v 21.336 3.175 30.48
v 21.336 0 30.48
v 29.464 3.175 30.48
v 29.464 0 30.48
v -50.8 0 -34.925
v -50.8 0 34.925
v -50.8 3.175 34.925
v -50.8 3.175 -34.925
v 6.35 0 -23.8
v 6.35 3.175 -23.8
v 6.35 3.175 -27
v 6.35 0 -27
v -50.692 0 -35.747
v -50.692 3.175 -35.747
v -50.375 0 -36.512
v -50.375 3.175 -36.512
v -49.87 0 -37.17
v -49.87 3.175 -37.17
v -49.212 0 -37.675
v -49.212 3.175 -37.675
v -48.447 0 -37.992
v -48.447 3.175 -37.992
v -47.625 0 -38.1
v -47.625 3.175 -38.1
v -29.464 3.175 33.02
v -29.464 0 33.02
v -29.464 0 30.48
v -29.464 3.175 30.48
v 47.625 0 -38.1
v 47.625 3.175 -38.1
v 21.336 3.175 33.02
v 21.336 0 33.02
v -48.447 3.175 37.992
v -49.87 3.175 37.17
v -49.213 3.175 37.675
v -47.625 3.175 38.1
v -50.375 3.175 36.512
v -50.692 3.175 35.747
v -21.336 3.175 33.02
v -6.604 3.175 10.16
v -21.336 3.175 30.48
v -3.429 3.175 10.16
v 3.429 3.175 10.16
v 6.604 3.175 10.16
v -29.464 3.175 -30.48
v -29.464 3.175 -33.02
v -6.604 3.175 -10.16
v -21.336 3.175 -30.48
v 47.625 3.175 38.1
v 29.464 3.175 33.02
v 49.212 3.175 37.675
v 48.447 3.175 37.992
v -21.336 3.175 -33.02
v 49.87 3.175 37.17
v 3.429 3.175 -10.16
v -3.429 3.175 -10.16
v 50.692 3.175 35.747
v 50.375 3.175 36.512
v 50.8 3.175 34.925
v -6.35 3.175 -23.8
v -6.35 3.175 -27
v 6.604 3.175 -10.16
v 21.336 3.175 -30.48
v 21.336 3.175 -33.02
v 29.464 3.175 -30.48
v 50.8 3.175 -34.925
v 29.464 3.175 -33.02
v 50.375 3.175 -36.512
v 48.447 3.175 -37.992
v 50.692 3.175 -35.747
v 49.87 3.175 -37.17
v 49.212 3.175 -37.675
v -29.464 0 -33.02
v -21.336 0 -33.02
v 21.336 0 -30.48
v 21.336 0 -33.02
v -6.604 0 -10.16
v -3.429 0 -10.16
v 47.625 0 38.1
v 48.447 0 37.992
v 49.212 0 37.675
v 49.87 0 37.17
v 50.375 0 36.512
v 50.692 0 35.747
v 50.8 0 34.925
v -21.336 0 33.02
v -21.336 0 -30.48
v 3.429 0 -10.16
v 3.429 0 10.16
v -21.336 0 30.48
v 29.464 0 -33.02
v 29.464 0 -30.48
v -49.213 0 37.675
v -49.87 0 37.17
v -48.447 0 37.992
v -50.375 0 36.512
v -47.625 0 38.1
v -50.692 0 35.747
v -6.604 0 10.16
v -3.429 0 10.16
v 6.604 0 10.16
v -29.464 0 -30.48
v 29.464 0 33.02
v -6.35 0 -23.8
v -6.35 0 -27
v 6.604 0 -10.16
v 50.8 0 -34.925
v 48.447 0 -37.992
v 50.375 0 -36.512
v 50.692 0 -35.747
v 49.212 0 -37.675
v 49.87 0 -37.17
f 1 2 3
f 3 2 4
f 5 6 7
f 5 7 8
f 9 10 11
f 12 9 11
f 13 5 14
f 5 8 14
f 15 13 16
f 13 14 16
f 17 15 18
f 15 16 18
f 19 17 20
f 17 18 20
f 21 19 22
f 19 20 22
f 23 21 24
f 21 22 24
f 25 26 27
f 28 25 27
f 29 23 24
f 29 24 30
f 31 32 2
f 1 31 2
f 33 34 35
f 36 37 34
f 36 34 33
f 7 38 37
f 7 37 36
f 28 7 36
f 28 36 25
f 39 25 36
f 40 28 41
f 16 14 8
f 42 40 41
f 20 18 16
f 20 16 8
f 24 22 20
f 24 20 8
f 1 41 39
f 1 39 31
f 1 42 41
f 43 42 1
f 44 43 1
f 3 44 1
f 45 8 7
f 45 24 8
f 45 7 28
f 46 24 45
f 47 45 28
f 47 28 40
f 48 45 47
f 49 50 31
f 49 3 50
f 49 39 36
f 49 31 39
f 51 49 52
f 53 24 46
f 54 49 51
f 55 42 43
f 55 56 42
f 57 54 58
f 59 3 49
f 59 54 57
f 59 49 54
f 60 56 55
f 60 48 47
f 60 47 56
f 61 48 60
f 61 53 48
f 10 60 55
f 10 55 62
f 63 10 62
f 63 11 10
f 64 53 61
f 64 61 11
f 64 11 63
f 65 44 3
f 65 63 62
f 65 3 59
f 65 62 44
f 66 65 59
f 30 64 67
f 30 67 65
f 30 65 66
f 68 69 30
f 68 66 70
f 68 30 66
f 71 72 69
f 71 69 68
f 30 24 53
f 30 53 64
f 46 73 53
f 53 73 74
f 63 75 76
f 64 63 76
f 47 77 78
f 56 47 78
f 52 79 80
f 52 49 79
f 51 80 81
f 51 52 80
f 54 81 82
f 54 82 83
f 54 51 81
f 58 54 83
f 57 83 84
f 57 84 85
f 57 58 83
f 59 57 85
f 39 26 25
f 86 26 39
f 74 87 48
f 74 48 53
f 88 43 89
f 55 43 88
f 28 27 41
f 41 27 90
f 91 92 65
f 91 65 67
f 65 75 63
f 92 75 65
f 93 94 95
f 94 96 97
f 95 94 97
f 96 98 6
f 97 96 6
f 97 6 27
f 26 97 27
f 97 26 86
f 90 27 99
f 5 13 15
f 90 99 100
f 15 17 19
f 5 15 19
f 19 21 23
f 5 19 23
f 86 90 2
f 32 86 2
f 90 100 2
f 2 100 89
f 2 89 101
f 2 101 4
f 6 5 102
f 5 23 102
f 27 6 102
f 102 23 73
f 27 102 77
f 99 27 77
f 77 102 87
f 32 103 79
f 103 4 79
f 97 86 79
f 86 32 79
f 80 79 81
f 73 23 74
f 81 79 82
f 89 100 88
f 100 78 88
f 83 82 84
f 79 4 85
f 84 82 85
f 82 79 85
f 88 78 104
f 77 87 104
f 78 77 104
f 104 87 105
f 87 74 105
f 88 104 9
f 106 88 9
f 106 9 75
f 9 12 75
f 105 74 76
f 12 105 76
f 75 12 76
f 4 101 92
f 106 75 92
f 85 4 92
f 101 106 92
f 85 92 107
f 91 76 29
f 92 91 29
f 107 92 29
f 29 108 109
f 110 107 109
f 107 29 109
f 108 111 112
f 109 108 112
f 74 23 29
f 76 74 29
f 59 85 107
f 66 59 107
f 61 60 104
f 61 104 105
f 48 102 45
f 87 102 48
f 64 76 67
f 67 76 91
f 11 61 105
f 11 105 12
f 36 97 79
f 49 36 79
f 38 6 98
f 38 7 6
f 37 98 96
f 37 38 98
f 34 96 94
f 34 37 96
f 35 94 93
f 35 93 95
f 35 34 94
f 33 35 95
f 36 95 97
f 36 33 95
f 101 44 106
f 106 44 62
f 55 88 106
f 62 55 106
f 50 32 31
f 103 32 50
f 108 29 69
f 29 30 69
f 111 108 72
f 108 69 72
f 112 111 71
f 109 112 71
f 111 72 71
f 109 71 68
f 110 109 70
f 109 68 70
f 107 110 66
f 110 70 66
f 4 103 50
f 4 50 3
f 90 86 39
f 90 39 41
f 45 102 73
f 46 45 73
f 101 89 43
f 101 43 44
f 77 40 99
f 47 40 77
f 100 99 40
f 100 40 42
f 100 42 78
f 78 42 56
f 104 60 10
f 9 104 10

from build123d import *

# Parameters (mm, degrees)
SKETCH1_W           = 101.6
SKETCH1_H           = 76.2
SKETCH1_W_2         = 8.128
SKETCH1_H_2         = 2.54
BOSS_EXTRUDE1_DEPTH = 3.175
FILLET1_R           = 3.175
SKETCH2_W           = 3.175
SKETCH2_H           = 20.32
SKETCH2_W_2         = 12.7
SKETCH2_H_2         = 3.2004
CUT_EXTRUDE1_DEPTH  = 3.175


with BuildPart() as part:
    # Sketch1 → Boss-Extrude1 (new body)
    with BuildSketch(Plane(origin=(0, 0, 0), x_dir=(1, 0, 0), z_dir=(0, 1, 0))):
        Rectangle(SKETCH1_W, SKETCH1_H)
        with Locations((-25.4, 31.75)):
            Rectangle(SKETCH1_W_2, SKETCH1_H_2, mode=Mode.SUBTRACT)
        with Locations((-25.4, -31.75)):
            Rectangle(SKETCH1_W_2, SKETCH1_H_2, mode=Mode.SUBTRACT)
        with Locations((25.4, -31.75)):
            Rectangle(SKETCH1_W_2, SKETCH1_H_2, mode=Mode.SUBTRACT)
        with Locations((25.4, 31.75)):
            Rectangle(SKETCH1_W_2, SKETCH1_H_2, mode=Mode.SUBTRACT)
    extrude(amount=BOSS_EXTRUDE1_DEPTH)

    # Fillet1
    fillet1_edges = [part.edges().sort_by_distance(p)[0] for p in [
        (50.8, 1.5875, 38.1),
        (-50.8, 1.5875, 38.1),
        (-50.8, 1.5875, -38.1),
        (50.8, 1.5875, -38.1),
    ]]
    fillet(fillet1_edges, radius=FILLET1_R)

    # Sketch2 → Cut-Extrude1 (cut)
    with BuildSketch(Plane(origin=(0, 3.175, 0), x_dir=(1, 0, 0), z_dir=(0, 1, 0))):
        with Locations((-5.0165, 0)):
            Rectangle(SKETCH2_W, SKETCH2_H)
        with Locations((5.0165, 0)):
            Rectangle(SKETCH2_W, SKETCH2_H)
        with Locations((0, 25.4)):
            Rectangle(SKETCH2_W_2, SKETCH2_H_2)
    extrude(amount=-CUT_EXTRUDE1_DEPTH, mode=Mode.SUBTRACT)


solid = part.part
